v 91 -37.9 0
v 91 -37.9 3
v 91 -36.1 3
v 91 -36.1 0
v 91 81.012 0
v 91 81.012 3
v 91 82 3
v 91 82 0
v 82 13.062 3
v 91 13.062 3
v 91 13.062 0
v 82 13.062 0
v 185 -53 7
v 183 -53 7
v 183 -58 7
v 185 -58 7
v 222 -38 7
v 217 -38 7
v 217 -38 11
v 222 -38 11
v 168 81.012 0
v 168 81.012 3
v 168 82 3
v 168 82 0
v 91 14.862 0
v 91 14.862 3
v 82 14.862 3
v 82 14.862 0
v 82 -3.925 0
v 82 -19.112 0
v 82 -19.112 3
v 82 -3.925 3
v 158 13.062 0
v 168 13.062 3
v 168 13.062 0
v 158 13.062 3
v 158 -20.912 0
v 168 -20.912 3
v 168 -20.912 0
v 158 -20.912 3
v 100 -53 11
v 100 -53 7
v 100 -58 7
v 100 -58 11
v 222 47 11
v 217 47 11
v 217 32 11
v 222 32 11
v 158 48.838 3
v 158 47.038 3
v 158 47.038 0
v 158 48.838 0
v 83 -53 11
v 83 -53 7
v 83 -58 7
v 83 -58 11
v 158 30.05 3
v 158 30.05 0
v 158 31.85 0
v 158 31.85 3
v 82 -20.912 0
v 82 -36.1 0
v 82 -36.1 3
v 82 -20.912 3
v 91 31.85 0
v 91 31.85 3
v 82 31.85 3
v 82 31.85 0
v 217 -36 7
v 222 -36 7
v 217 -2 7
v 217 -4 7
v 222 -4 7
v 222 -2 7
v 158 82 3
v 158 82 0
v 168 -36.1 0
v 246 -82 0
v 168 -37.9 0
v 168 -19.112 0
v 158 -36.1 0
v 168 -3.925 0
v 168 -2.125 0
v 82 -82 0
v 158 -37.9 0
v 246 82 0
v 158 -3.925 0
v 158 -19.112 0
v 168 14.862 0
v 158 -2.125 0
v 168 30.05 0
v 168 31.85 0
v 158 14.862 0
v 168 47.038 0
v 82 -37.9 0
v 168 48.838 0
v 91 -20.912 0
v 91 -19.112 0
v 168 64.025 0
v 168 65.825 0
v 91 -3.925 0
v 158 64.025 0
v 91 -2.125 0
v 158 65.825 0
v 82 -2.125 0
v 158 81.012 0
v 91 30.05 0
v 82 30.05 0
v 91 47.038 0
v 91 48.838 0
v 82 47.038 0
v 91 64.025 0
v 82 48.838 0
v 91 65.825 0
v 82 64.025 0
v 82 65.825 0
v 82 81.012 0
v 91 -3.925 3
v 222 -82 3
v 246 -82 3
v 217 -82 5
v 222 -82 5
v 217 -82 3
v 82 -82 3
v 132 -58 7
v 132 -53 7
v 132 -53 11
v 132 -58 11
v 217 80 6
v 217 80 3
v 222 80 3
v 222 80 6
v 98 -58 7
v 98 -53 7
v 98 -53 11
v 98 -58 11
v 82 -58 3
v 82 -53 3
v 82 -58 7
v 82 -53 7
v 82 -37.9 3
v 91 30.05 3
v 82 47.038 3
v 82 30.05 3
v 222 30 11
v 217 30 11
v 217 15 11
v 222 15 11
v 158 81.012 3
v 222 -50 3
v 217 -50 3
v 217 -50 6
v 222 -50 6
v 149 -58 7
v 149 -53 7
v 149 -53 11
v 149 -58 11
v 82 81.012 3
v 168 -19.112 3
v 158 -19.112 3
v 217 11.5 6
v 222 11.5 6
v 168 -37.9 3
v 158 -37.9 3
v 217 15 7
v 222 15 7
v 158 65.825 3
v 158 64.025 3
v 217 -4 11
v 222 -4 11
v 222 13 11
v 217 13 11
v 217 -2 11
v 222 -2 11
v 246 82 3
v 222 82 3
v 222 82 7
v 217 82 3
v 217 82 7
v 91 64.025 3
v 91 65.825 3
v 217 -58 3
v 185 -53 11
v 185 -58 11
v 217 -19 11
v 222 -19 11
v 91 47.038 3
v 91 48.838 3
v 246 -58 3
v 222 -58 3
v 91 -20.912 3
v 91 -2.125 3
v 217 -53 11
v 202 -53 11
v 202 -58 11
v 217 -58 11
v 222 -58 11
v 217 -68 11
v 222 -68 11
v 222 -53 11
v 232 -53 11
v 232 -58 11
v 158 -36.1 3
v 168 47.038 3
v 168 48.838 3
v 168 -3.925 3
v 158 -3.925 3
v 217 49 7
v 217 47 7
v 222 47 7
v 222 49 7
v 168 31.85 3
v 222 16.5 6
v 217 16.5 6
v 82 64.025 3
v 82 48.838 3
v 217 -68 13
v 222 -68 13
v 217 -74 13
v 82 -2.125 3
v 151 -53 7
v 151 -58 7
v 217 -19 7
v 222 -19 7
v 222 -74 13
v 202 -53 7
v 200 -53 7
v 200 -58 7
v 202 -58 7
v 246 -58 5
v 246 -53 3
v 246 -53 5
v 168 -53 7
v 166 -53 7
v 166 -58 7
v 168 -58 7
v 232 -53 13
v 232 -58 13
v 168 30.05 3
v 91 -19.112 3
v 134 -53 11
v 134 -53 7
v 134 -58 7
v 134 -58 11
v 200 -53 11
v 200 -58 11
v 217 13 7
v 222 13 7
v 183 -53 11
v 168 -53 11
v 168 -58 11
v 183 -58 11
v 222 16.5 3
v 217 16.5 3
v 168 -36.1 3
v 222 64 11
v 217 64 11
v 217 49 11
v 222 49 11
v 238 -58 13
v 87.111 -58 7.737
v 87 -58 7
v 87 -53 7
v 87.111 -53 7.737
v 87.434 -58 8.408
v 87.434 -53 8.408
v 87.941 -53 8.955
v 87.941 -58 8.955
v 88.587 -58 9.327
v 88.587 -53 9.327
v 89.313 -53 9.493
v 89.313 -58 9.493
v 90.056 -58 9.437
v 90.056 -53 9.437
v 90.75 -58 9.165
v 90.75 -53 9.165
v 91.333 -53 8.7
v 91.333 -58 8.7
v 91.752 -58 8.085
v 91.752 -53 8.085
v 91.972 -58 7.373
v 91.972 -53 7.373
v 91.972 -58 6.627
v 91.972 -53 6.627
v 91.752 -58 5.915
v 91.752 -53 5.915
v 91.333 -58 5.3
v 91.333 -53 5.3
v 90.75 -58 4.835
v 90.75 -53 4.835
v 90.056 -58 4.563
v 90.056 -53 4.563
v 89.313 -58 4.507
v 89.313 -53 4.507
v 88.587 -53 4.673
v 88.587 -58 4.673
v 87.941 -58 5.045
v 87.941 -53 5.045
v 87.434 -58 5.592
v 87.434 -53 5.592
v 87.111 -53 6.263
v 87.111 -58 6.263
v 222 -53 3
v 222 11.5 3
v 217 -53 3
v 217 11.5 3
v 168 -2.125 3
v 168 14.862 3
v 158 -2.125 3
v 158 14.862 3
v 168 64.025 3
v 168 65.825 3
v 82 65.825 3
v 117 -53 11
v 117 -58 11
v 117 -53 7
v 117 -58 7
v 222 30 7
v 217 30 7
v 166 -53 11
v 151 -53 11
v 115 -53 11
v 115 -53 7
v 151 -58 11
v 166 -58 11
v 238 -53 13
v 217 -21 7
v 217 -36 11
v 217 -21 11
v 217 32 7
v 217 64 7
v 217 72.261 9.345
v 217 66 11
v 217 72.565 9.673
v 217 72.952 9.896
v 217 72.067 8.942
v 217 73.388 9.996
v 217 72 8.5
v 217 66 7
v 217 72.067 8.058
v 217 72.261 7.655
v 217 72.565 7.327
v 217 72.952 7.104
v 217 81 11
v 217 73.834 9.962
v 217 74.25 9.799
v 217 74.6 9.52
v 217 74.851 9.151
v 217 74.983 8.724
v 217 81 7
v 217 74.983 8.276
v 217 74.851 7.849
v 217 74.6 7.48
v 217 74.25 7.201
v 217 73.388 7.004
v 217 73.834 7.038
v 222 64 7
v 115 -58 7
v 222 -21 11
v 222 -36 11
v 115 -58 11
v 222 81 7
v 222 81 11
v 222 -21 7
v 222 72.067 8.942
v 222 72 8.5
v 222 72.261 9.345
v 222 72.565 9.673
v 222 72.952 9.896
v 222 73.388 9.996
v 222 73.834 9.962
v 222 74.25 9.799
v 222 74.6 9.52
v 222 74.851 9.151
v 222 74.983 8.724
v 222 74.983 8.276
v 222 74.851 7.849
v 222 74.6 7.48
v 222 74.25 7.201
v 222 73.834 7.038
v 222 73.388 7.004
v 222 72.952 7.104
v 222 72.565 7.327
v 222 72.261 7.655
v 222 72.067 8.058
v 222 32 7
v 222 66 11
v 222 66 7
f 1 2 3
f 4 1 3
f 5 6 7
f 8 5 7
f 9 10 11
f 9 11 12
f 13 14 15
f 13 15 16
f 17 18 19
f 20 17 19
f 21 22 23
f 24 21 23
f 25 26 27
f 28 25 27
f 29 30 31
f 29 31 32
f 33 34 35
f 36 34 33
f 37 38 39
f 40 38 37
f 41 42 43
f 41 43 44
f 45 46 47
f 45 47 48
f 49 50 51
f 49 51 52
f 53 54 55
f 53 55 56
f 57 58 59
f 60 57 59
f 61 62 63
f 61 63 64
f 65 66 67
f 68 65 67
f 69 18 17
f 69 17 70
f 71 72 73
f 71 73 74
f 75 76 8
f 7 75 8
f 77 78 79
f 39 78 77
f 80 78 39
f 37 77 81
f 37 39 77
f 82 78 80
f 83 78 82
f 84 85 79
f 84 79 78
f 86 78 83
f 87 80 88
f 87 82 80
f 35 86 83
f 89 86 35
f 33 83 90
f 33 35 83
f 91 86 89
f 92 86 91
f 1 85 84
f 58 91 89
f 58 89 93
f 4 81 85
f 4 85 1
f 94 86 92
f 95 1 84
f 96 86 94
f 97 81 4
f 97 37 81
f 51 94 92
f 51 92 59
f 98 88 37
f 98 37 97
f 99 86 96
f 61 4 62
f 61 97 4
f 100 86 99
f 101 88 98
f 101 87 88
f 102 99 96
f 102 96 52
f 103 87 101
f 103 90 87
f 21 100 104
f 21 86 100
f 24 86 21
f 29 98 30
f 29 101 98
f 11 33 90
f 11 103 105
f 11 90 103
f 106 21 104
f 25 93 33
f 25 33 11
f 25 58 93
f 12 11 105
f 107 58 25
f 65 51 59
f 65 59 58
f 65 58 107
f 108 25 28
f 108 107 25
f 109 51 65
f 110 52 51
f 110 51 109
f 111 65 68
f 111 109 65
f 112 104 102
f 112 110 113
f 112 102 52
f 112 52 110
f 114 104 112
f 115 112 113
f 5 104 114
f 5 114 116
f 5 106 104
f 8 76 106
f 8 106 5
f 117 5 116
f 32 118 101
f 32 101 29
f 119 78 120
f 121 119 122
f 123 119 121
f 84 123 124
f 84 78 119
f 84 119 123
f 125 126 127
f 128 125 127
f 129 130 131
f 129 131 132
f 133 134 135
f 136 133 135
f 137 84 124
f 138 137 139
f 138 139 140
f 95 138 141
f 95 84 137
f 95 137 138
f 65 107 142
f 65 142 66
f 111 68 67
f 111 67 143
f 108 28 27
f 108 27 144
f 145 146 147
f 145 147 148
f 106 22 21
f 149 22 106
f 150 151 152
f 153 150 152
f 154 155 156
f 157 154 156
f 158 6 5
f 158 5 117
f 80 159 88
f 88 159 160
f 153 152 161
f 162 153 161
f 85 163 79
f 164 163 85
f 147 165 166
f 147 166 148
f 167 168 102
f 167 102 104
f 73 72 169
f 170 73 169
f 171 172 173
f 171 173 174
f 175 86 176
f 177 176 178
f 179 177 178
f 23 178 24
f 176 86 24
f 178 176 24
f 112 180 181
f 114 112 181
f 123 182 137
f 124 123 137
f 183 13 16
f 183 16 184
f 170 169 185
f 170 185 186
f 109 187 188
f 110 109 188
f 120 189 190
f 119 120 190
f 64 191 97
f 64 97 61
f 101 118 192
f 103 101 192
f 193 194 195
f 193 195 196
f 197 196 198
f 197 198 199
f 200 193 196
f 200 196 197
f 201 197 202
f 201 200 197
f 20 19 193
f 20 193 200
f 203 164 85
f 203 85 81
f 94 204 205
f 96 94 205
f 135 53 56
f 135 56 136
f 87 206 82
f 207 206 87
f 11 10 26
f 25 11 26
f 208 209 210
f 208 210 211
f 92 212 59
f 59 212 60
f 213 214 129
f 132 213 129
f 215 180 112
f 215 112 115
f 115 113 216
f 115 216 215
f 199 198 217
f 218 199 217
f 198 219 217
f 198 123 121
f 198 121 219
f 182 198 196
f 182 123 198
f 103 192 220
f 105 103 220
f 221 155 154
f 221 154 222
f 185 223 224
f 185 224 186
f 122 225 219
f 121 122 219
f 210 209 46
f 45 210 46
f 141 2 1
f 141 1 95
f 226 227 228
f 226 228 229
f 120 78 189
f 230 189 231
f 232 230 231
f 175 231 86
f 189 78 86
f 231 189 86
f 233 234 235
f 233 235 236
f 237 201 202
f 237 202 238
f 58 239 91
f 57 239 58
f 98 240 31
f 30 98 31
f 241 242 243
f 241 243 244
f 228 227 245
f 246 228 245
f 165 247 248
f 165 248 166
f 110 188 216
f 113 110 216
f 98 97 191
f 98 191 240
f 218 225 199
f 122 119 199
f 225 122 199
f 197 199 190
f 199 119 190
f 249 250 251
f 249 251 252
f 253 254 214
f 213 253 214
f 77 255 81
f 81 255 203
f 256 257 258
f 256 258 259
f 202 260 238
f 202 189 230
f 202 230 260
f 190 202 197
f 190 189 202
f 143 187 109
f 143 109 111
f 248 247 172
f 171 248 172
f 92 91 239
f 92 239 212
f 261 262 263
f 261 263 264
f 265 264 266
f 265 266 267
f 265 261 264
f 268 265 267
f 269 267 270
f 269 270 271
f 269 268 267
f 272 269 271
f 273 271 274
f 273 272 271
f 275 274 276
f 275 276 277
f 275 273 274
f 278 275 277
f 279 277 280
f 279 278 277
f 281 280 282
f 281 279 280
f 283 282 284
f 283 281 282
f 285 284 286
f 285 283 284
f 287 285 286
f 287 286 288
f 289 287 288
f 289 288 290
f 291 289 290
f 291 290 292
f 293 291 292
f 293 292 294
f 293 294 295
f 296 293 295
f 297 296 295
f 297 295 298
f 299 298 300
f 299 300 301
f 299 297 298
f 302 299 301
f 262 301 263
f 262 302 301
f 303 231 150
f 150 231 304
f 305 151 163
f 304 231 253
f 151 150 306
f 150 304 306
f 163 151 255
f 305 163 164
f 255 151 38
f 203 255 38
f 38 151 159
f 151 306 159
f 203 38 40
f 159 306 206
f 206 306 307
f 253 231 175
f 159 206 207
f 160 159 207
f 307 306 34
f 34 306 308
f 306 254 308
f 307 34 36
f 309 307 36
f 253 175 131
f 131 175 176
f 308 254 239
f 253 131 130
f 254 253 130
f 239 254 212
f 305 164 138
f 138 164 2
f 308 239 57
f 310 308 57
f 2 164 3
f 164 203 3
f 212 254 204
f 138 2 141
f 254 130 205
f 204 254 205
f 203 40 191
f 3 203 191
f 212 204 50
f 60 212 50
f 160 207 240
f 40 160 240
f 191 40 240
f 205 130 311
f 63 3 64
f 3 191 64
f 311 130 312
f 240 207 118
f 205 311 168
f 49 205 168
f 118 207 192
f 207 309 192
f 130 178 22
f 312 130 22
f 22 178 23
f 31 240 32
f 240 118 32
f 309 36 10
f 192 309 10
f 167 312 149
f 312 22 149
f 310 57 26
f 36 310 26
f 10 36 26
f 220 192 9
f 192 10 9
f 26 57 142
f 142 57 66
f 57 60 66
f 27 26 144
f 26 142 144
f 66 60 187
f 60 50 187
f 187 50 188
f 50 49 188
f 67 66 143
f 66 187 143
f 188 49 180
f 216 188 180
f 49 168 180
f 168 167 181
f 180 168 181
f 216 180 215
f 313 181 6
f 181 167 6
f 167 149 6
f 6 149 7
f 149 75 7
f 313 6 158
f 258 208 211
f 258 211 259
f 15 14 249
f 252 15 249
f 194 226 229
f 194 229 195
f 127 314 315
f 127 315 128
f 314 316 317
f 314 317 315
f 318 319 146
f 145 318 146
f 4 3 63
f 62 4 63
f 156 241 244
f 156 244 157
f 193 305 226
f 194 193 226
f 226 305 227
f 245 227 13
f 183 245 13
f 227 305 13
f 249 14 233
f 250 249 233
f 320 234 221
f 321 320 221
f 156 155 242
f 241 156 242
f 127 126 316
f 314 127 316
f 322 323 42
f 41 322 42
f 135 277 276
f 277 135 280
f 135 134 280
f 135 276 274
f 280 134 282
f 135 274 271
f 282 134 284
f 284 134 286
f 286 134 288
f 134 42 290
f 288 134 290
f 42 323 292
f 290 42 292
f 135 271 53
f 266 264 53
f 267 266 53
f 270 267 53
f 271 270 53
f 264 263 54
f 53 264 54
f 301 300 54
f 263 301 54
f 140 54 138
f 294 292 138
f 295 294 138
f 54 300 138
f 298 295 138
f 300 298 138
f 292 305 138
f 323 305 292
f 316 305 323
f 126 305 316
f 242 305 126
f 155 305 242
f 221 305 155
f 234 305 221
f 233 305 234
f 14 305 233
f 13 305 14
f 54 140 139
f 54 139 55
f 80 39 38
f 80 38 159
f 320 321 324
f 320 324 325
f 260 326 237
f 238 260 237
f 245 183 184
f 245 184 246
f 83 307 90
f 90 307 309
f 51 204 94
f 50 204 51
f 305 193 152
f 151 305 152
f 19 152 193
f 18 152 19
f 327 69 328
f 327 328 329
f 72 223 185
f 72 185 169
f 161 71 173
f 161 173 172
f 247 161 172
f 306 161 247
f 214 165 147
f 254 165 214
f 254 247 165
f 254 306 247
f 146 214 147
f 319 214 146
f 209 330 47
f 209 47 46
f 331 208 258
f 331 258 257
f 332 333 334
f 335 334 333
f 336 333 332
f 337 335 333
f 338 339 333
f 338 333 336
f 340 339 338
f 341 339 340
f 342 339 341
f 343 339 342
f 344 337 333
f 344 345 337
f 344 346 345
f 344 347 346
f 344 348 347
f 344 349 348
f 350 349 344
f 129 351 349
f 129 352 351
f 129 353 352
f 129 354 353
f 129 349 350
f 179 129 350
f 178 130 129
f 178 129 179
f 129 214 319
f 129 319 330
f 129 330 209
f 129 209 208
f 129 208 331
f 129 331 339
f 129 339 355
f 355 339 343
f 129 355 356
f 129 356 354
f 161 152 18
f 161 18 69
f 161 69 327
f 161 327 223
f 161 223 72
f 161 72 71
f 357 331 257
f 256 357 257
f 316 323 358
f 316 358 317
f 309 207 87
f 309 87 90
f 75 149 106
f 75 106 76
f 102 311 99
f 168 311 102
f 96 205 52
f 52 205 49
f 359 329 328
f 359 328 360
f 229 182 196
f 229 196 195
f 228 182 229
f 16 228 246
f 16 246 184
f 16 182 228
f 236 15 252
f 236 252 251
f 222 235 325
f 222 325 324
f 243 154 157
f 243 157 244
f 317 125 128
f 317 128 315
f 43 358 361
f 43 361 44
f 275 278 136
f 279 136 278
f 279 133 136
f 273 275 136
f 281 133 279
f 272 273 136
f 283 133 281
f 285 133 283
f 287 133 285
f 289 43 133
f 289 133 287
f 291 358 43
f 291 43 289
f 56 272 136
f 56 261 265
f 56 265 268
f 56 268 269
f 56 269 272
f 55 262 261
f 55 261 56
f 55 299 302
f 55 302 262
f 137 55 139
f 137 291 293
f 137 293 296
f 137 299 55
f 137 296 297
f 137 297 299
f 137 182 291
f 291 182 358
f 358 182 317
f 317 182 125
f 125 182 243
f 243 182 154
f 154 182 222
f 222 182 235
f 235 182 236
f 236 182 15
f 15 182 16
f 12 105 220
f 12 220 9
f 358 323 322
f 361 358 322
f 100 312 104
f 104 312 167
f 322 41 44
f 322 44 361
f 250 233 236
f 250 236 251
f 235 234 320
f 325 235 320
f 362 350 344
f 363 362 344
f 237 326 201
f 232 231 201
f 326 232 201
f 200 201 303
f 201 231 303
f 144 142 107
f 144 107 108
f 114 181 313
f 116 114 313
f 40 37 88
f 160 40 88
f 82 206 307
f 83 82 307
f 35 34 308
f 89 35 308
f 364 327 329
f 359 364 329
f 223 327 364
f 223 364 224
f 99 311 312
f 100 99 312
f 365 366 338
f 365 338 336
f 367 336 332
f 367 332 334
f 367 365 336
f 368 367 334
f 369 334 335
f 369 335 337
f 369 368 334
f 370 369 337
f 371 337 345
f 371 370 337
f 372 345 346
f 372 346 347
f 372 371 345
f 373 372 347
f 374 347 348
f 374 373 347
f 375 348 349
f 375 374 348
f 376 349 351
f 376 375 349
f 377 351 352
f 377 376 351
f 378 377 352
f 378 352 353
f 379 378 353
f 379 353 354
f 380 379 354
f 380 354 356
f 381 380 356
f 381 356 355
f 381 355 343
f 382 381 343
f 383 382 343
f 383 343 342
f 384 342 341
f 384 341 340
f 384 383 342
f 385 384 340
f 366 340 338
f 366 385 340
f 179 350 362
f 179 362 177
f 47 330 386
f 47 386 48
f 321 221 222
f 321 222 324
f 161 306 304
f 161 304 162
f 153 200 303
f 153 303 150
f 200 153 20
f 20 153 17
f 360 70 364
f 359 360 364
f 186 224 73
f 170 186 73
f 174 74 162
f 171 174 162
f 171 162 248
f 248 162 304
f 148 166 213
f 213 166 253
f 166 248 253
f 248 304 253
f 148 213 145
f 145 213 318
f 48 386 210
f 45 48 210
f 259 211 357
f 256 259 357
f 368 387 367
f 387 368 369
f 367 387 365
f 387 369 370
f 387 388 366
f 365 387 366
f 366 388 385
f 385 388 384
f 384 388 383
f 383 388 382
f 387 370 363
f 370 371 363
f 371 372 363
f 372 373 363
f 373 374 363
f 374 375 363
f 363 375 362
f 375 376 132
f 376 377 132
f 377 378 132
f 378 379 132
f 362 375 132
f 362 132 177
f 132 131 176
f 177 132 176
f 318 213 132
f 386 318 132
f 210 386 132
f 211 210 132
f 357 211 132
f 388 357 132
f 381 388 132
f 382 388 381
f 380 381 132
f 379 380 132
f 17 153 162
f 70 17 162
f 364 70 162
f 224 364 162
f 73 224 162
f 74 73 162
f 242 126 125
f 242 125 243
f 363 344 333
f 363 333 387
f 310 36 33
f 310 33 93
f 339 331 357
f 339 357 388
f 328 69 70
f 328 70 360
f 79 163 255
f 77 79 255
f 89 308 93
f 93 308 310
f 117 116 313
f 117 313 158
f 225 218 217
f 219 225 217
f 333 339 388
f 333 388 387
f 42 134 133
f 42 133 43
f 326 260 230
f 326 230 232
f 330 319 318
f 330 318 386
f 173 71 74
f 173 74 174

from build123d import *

# Parameters (mm, degrees)
SKETCH_W                           = 164
SKETCH_H                           = 164
PAD_DEPTH                          = 3
SKETCH001_W                        = 164
SKETCH001_H                        = 5
SKETCH001_W_2                      = 5
SKETCH001_H_2                      = 164
PAD001_DEPTH                       = 10
SKETCH005_W                        = 150
SKETCH005_H                        = 2
POCKET_DEPTH                       = 5
SKETCH006_W                        = 150
SKETCH006_H                        = 2
POCKET001_DEPTH                    = 5
SKETCH007_W                        = 2
SKETCH007_H                        = 4
POCKET002_DEPTH                    = 5
LINEARPATTERN_COUNT                = 9
LINEARPATTERN_PITCH                = 17
SKETCH008_W                        = 61.5
SKETCH008_H                        = 3
SKETCH008_W_2                      = 63.5
POCKET003_DEPTH                    = 5
SKETCH009_W                        = 2
SKETCH009_H                        = 4
POCKET004_DEPTH                    = 5
LINEARPATTERN001_COUNT             = 9
LINEARPATTERN001_PITCH             = 17
SKETCH010_W                        = 10
SKETCH010_H                        = 1.8
POCKET005_DEPTH                    = 5
SKETCH010_LINEARPATTERN002_2_W     = 10
SKETCH010_LINEARPATTERN002_2_H     = 1.8
POCKET005_LINEARPATTERN002_2_DEPTH = 5
SKETCH010_LINEARPATTERN002_3_W     = 10
SKETCH010_LINEARPATTERN002_3_H     = 1.8
POCKET005_LINEARPATTERN002_3_DEPTH = 5
SKETCH010_LINEARPATTERN002_4_W     = 10
SKETCH010_LINEARPATTERN002_4_H     = 1.8
POCKET005_LINEARPATTERN002_4_DEPTH = 5
SKETCH010_LINEARPATTERN002_5_W     = 10
SKETCH010_LINEARPATTERN002_5_H     = 1.8
POCKET005_LINEARPATTERN002_5_DEPTH = 5
SKETCH010_LINEARPATTERN002_6_W     = 10
SKETCH010_LINEARPATTERN002_6_H     = 1.8
POCKET005_LINEARPATTERN002_6_DEPTH = 5
SKETCH010_LINEARPATTERN002_7_W     = 10
SKETCH010_LINEARPATTERN002_7_H     = 1.8
POCKET005_LINEARPATTERN002_7_DEPTH = 5
SKETCH010_LINEARPATTERN002_8_W     = 10
SKETCH010_LINEARPATTERN002_8_H     = 1.8
POCKET005_LINEARPATTERN002_8_DEPTH = 5
SKETCH010_LINEARPATTERN002_9_W     = 10
SKETCH010_LINEARPATTERN002_9_H     = 1.8
POCKET005_LINEARPATTERN002_9_DEPTH = 5
LINEARPATTERN003_COUNT             = 2
LINEARPATTERN003_PITCH             = 77
SKETCH011_R                        = 2.5
POCKET006_DEPTH                    = 5
SKETCH012_R                        = 1.5
POCKET007_DEPTH                    = 5
CHAMFER_SIZE                       = 8


with BuildPart() as lb_plate:
    # Sketch → Pad (new body)
    with BuildSketch(Plane.XY):
        Rectangle(SKETCH_W, SKETCH_H)
    extrude(amount=PAD_DEPTH)

    # Sketch001 (on Face6 of Pad) → Pad001 (join)
    with BuildSketch(Plane.XY.offset(3)):
        with Locations((0, -55.5)):
            Rectangle(SKETCH001_W, SKETCH001_H)
        with Locations((-55.5, 0)):
            Rectangle(SKETCH001_W_2, SKETCH001_H_2)
    extrude(amount=PAD001_DEPTH)

    # Sketch005 → Pocket (cut)
    with BuildSketch(Plane(origin=(0, -53, 0), x_dir=(-1, 0, 0), z_dir=(0, 1, 0))):
        with Locations((-7, 12)):
            Rectangle(SKETCH005_W, SKETCH005_H)
    extrude(amount=-POCKET_DEPTH, mode=Mode.SUBTRACT)

    # Sketch006 (on Face15 of Pocket) → Pocket001 (cut)
    with BuildSketch(Plane.YZ.offset(-53)):
        with Locations((7, 12)):
            Rectangle(SKETCH006_W, SKETCH006_H)
    extrude(amount=-POCKET001_DEPTH, mode=Mode.SUBTRACT)

    # Sketch007 (on Face16 of Pocket001) → Pocket002 (cut)
    with BuildSketch(Plane.YZ.offset(-53)):
        with Locations((-37, 9)):
            Rectangle(SKETCH007_W, SKETCH007_H)
    pocket002 = extrude(amount=-POCKET002_DEPTH, mode=Mode.SUBTRACT)

    # LinearPattern: Pocket002 ×9
    with Locations(*[(0, i * LINEARPATTERN_PITCH, 0) for i in range(1, LINEARPATTERN_COUNT)]):
        add(pocket002, mode=Mode.SUBTRACT)

    # Sketch008 (on Face16 of LinearPattern) → Pocket003 (cut)
    with BuildSketch(Plane.YZ.offset(-53)):
        with Locations((-19.25, 4.5)):
            Rectangle(SKETCH008_W, SKETCH008_H)
        with Locations((48.25, 4.5)):
            Rectangle(SKETCH008_W_2, SKETCH008_H)
    extrude(amount=-POCKET003_DEPTH, mode=Mode.SUBTRACT)

    # Sketch009 (on Face19 of Pocket003) → Pocket004 (cut)
    with BuildSketch(Plane(origin=(0, -53, 0), x_dir=(-1, 0, 0), z_dir=(0, 1, 0))):
        with Locations((37, 9)):
            Rectangle(SKETCH009_W, SKETCH009_H)
    pocket004 = extrude(amount=-POCKET004_DEPTH, mode=Mode.SUBTRACT)

    # LinearPattern001: Pocket004 ×9
    with Locations(*[(i * LINEARPATTERN001_PITCH, 0, 0) for i in range(1, LINEARPATTERN001_COUNT)]):
        add(pocket004, mode=Mode.SUBTRACT)

    # Sketch010 (on Face7 of Pocket004) → Pocket005 (cut)
    with BuildSketch(Plane.XY.offset(3)):
        with Locations((1, -37)):
            Rectangle(SKETCH010_W, SKETCH010_H)
    pocket005 = extrude(amount=-POCKET005_DEPTH, mode=Mode.SUBTRACT)

    # Sketch010 LinearPattern002 2 → Pocket005 LinearPattern002 2 (cut)
    with BuildSketch(Plane(origin=(0, 16.9875, 3), x_dir=(1, 0, 0), z_dir=(0, 0, 1))):
        with Locations((1, -37)):
            Rectangle(SKETCH010_LINEARPATTERN002_2_W, SKETCH010_LINEARPATTERN002_2_H)
    pocket005_linearpattern002_2 = extrude(amount=-POCKET005_LINEARPATTERN002_2_DEPTH, mode=Mode.SUBTRACT)

    # Sketch010 LinearPattern002 3 → Pocket005 LinearPattern002 3 (cut)
    with BuildSketch(Plane(origin=(0, 33.975, 3), x_dir=(1, 0, 0), z_dir=(0, 0, 1))):
        with Locations((1, -37)):
            Rectangle(SKETCH010_LINEARPATTERN002_3_W, SKETCH010_LINEARPATTERN002_3_H)
    pocket005_linearpattern002_3 = extrude(amount=-POCKET005_LINEARPATTERN002_3_DEPTH, mode=Mode.SUBTRACT)

    # Sketch010 LinearPattern002 4 → Pocket005 LinearPattern002 4 (cut)
    with BuildSketch(Plane(origin=(0, 50.9625, 3), x_dir=(1, 0, 0), z_dir=(0, 0, 1))):
        with Locations((1, -37)):
            Rectangle(SKETCH010_LINEARPATTERN002_4_W, SKETCH010_LINEARPATTERN002_4_H)
    pocket005_linearpattern002_4 = extrude(amount=-POCKET005_LINEARPATTERN002_4_DEPTH, mode=Mode.SUBTRACT)

    # Sketch010 LinearPattern002 5 → Pocket005 LinearPattern002 5 (cut)
    with BuildSketch(Plane(origin=(0, 67.95, 3), x_dir=(1, 0, 0), z_dir=(0, 0, 1))):
        with Locations((1, -37)):
            Rectangle(SKETCH010_LINEARPATTERN002_5_W, SKETCH010_LINEARPATTERN002_5_H)
    pocket005_linearpattern002_5 = extrude(amount=-POCKET005_LINEARPATTERN002_5_DEPTH, mode=Mode.SUBTRACT)

    # Sketch010 LinearPattern002 6 → Pocket005 LinearPattern002 6 (cut)
    with BuildSketch(Plane(origin=(0, 84.9375, 3), x_dir=(1, 0, 0), z_dir=(0, 0, 1))):
        with Locations((1, -37)):
            Rectangle(SKETCH010_LINEARPATTERN002_6_W, SKETCH010_LINEARPATTERN002_6_H)
    pocket005_linearpattern002_6 = extrude(amount=-POCKET005_LINEARPATTERN002_6_DEPTH, mode=Mode.SUBTRACT)

    # Sketch010 LinearPattern002 7 → Pocket005 LinearPattern002 7 (cut)
    with BuildSketch(Plane(origin=(0, 101.925, 3), x_dir=(1, 0, 0), z_dir=(0, 0, 1))):
        with Locations((1, -37)):
            Rectangle(SKETCH010_LINEARPATTERN002_7_W, SKETCH010_LINEARPATTERN002_7_H)
    pocket005_linearpattern002_7 = extrude(amount=-POCKET005_LINEARPATTERN002_7_DEPTH, mode=Mode.SUBTRACT)

    # Sketch010 LinearPattern002 8 → Pocket005 LinearPattern002 8 (cut)
    with BuildSketch(Plane(origin=(0, 118.9125, 3), x_dir=(1, 0, 0), z_dir=(0, 0, 1))):
        with Locations((1, -37)):
            Rectangle(SKETCH010_LINEARPATTERN002_8_W, SKETCH010_LINEARPATTERN002_8_H)
    pocket005_linearpattern002_8 = extrude(amount=-POCKET005_LINEARPATTERN002_8_DEPTH, mode=Mode.SUBTRACT)

    # Sketch010 LinearPattern002 9 → Pocket005 LinearPattern002 9 (cut)
    with BuildSketch(Plane(origin=(0, 135.9, 3), x_dir=(1, 0, 0), z_dir=(0, 0, 1))):
        with Locations((1, -37)):
            Rectangle(SKETCH010_LINEARPATTERN002_9_W, SKETCH010_LINEARPATTERN002_9_H)
    pocket005_linearpattern002_9 = extrude(amount=-POCKET005_LINEARPATTERN002_9_DEPTH, mode=Mode.SUBTRACT)

    # LinearPattern003: Pocket005, Pocket005 LinearPattern002 2, Pocket005 LinearPattern002 3, Pocket005 LinearPattern002 4, Pocket005 LinearPattern002 5, Pocket005 LinearPattern002 6, Pocket005 LinearPattern002 7, Pocket005 LinearPattern002 8, Pocket005 LinearPattern002 9 ×2
    with Locations(*[(i * LINEARPATTERN003_PITCH, 0, 0) for i in range(1, LINEARPATTERN003_COUNT)]):
        add(pocket005, mode=Mode.SUBTRACT)
        add(pocket005_linearpattern002_2, mode=Mode.SUBTRACT)
        add(pocket005_linearpattern002_3, mode=Mode.SUBTRACT)
        add(pocket005_linearpattern002_4, mode=Mode.SUBTRACT)
        add(pocket005_linearpattern002_5, mode=Mode.SUBTRACT)
        add(pocket005_linearpattern002_6, mode=Mode.SUBTRACT)
        add(pocket005_linearpattern002_7, mode=Mode.SUBTRACT)
        add(pocket005_linearpattern002_8, mode=Mode.SUBTRACT)
        add(pocket005_linearpattern002_9, mode=Mode.SUBTRACT)

    # Sketch011 (on Face155 of MultiTransform) → Pocket006 (cut)
    with BuildSketch(Plane.XZ.offset(58)):
        with Locations((74.5, 7)):
            Circle(SKETCH011_R)
    extrude(amount=-POCKET006_DEPTH, mode=Mode.SUBTRACT)

    # Sketch012 (on Face75 of Pocket006) → Pocket007 (cut)
    with BuildSketch(Plane(origin=(-58, 0, 0), x_dir=(0, -1, 0), z_dir=(-1, 0, 0))):
        with Locations((-73.5, 8.5)):
            Circle(SKETCH012_R)
    extrude(amount=-POCKET007_DEPTH, mode=Mode.SUBTRACT)

    # Chamfer
    chamfer_edges = [lb_plate.edges().sort_by_distance(p)[0] for p in [
        (-82, -55.5, 13),
        (-55.5, -82, 13),
    ]]
    chamfer(chamfer_edges, length=CHAMFER_SIZE)


with BuildPart() as part_mirroring:
    # Part__Mirroring: instance of LB_plate
    add(lb_plate.part.mirror(Plane(origin=(82, 0, 0), x_dir=(0, -1, 0), z_dir=(1, 0, 0))))


solid = part_mirroring.part
